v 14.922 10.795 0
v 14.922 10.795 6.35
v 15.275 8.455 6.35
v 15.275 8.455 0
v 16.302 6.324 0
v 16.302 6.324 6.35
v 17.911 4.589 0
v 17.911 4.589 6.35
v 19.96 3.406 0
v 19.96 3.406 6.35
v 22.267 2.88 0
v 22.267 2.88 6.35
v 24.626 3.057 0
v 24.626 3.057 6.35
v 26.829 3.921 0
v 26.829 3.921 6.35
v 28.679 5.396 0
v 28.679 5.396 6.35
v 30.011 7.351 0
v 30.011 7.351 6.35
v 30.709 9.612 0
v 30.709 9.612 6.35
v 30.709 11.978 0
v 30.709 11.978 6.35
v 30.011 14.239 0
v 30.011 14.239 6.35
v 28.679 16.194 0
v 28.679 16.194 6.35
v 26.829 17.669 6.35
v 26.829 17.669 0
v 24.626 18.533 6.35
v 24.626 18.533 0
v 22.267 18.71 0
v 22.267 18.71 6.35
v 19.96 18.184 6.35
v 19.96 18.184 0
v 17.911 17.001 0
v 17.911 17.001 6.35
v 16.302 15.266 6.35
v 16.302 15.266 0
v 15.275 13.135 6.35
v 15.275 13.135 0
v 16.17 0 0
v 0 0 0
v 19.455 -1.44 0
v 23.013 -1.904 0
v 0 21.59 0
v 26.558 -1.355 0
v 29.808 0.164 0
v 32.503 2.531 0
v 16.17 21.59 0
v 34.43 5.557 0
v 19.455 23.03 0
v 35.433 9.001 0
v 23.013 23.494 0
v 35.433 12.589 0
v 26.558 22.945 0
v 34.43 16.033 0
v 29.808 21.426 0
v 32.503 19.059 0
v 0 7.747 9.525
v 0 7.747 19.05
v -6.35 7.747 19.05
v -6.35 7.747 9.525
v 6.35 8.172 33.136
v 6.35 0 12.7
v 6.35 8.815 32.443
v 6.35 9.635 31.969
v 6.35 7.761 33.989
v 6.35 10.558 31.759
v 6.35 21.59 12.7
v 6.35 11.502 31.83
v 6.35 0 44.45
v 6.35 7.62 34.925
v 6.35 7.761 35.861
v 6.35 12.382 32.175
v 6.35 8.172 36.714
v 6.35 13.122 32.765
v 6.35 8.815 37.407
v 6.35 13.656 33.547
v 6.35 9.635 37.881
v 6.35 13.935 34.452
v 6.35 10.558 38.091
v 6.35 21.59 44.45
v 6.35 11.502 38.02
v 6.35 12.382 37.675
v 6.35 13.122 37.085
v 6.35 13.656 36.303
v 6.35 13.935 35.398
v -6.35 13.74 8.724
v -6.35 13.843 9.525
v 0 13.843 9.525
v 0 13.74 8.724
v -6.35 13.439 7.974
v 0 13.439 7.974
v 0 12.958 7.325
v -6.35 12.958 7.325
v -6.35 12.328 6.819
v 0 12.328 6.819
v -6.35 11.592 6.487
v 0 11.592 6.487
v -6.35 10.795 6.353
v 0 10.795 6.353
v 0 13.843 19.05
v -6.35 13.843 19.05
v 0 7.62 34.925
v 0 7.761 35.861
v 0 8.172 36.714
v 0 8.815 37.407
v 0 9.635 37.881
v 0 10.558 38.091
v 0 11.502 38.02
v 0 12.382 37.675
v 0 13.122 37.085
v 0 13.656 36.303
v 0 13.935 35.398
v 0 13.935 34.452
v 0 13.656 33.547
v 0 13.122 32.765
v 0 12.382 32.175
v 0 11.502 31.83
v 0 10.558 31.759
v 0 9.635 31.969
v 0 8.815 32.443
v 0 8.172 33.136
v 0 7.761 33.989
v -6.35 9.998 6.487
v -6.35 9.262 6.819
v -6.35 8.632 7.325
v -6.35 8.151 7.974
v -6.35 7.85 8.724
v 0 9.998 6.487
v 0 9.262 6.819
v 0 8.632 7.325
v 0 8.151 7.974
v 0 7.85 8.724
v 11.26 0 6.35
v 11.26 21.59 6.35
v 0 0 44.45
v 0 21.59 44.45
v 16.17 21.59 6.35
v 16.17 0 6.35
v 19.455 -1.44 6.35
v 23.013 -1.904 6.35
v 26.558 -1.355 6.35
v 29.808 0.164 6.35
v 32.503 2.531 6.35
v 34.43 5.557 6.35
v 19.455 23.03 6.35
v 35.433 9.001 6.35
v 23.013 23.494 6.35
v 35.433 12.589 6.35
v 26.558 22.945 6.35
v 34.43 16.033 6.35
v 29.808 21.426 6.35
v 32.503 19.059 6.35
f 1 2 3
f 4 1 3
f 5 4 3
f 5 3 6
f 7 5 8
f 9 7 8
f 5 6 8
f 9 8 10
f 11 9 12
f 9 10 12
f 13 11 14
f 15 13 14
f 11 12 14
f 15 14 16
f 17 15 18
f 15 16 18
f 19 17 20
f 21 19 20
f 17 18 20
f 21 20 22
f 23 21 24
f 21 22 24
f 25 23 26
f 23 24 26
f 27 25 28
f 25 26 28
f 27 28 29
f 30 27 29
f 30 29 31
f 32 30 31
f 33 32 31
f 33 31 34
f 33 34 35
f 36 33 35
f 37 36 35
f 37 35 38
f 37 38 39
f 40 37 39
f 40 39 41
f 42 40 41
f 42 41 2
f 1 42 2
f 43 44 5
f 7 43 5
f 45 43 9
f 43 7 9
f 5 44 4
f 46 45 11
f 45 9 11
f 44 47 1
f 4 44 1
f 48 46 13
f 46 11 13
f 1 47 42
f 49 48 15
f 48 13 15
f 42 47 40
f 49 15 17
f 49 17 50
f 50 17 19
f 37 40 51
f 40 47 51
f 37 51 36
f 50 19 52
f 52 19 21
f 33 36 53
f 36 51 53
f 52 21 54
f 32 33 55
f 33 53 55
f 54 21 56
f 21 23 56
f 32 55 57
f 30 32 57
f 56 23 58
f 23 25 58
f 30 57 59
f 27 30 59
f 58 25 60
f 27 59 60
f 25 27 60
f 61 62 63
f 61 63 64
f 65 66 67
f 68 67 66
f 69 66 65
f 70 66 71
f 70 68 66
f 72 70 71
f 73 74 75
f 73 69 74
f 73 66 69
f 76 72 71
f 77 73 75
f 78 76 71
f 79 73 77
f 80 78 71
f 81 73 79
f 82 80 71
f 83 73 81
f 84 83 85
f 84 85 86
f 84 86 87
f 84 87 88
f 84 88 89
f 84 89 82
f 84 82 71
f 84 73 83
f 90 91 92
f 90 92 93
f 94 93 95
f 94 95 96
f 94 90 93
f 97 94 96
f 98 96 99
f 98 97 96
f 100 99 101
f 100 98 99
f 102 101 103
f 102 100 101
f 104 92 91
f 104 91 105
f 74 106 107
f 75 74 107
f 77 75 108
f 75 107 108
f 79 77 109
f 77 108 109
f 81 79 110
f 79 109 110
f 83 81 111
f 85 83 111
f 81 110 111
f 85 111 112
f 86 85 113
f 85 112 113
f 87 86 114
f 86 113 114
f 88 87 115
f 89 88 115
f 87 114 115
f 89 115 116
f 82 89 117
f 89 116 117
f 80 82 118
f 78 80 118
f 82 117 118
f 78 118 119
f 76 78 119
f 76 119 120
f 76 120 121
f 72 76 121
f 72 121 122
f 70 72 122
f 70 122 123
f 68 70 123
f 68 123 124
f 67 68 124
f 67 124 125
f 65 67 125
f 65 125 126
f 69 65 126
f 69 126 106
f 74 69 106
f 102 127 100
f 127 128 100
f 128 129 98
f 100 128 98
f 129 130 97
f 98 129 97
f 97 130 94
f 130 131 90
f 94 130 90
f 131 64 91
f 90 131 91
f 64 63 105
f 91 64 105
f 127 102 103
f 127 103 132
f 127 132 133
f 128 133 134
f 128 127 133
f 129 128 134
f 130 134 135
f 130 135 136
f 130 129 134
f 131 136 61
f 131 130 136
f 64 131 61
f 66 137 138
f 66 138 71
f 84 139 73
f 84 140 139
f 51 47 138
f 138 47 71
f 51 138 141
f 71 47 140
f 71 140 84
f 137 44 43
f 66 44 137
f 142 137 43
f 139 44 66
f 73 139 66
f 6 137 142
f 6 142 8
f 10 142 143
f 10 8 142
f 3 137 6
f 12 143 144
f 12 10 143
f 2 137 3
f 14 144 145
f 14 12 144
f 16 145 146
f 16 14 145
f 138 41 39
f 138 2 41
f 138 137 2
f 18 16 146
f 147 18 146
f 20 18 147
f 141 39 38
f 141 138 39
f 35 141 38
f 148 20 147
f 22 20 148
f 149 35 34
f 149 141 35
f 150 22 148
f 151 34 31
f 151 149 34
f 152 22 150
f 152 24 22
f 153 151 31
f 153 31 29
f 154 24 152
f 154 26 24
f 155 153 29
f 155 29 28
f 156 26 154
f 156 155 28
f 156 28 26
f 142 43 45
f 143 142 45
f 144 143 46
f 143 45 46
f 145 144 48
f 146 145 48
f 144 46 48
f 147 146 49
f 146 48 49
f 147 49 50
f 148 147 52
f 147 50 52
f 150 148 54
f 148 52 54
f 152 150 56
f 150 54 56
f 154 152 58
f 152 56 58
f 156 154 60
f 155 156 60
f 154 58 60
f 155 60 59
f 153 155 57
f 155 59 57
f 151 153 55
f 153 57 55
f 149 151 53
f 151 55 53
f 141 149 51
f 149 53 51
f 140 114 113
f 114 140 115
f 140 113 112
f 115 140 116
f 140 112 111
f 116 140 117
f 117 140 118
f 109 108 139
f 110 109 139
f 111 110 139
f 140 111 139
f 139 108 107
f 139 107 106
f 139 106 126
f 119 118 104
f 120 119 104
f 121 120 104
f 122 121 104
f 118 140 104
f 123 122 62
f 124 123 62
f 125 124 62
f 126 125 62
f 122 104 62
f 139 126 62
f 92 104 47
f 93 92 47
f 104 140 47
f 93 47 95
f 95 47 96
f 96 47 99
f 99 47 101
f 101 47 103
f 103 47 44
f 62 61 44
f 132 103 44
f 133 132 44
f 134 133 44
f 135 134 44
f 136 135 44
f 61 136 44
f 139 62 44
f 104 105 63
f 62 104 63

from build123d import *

# Parameters (mm, degrees)
F1_DEPTH    = 6.35
F0_W        = 3.175
F0_H        = 10.795
F2_DEPTH    = 44.45
F3_D        = 15.875
F5_D        = 6.35
F6_DEPTH    = 12.7
F7_T1_DEPTH = 14.2875
F9_DEPTH    = 21.59


# Not quite as in the source:
# - a fillet or chamfer that OpenCascade refuses, or shapes differently, is made with other operations: its cross-section is extruded or revolved along the edge and cut away or added


with BuildPart() as f1:
    # F0 (on Top) → F1 (new body)
    with BuildSketch(Plane.XY):
        with BuildLine():
            Line((22.86, 0), (16.1698598669, 0))
            ThreePointArc((16.1698598669, 0), (29.0375893482, -0.3012781979), (35.56, 10.795))
            ThreePointArc((35.56, 10.795), (29.0375893482, 21.8912781979), (16.1698598669, 21.59))
            Line((16.1698598669, 21.59), (22.86, 21.59))
            Line((22.86, 21.59), (22.86, 0))
        make_face()
        with BuildLine():
            ThreePointArc((16.1698598669, 21.59), (10.16, 10.795), (16.1698598669, 0))
            Line((16.1698598669, 0), (22.86, 0))
            Line((22.86, 0), (22.86, 21.59))
            Line((22.86, 21.59), (16.1698598669, 21.59))
        make_face()
        with BuildLine():
            Line((6.35, 10.795), (6.35, 0))
            Line((6.35, 0), (16.1698598669, 0))
            ThreePointArc((16.1698598669, 0), (10.16, 10.795), (16.1698598669, 21.59))
            Line((16.1698598669, 21.59), (6.35, 21.59))
            Line((6.35, 21.59), (6.35, 10.795))
        make_face()
    extrude(amount=F1_DEPTH)

    # F0 (on Top) → F2 (join)
    with BuildSketch(Plane.XY):
        with Locations((1.5875, 5.3975)):
            Rectangle(F0_W, F0_H)
        with Locations((4.7625, 5.3975)):
            Rectangle(F0_W, F0_H)
        with Locations((4.7625, 16.1925)):
            Rectangle(F0_W, F0_H)
        with Locations((1.5875, 16.1925)):
            Rectangle(F0_W, F0_H)
    extrude(amount=F2_DEPTH)

    # F3 (through all)
    with Locations(Plane(origin=(0, 0, 0), x_dir=(1, 0, 0), z_dir=(0, 0, -1))):
        with Locations((22.86, -10.795)):
            Hole(F3_D / 2)

    # F5 (through all)
    with Locations(Plane.YZ.offset(6.35)):
        with Locations((10.795, 34.925)):
            Hole(F5_D / 2)

    # F4 (on face) → F6 (join)
    with BuildSketch(Plane.YZ.offset(6.35)):
        Polygon((10.795, 12.7), (10.795, 19.05), (7.747, 19.05), (7.747, 6.35), (10.795, 6.35), align=None)
        Polygon((13.843, 19.05), (10.795, 19.05), (10.795, 12.7), (10.795, 6.35), (13.843, 6.35), align=None)
    extrude(amount=-F6_DEPTH)

    # F7: fillet of radius 3.175 on 2 edges, made by hand

    # F7_s2 → F7_t1 (cut)
    with BuildSketch(Plane.YZ.offset(-14.2875)):
        with BuildLine():
            ThreePointArc((10.922, 6.35), (8.6769359697, 7.2799359697), (7.747, 9.525))
            Line((7.747, 9.525), (7.747, 6.35))
            Line((7.747, 6.35), (10.922, 6.35))
        make_face()
        with BuildLine():
            ThreePointArc((13.843, 9.525), (12.9130640303, 7.2799359697), (10.668, 6.35))
            Line((10.668, 6.35), (13.843, 6.35))
            Line((13.843, 6.35), (13.843, 9.525))
        make_face()
    extrude(amount=F7_T1_DEPTH, mode=Mode.SUBTRACT)

    # F8 (on face) → F9 (join)
    with BuildSketch(Plane.XZ):
        Polygon((11.2599299335, 6.35), (6.35, 12.7), (6.35, 6.35), align=None)
    extrude(amount=-F9_DEPTH)


solid = f1.part
